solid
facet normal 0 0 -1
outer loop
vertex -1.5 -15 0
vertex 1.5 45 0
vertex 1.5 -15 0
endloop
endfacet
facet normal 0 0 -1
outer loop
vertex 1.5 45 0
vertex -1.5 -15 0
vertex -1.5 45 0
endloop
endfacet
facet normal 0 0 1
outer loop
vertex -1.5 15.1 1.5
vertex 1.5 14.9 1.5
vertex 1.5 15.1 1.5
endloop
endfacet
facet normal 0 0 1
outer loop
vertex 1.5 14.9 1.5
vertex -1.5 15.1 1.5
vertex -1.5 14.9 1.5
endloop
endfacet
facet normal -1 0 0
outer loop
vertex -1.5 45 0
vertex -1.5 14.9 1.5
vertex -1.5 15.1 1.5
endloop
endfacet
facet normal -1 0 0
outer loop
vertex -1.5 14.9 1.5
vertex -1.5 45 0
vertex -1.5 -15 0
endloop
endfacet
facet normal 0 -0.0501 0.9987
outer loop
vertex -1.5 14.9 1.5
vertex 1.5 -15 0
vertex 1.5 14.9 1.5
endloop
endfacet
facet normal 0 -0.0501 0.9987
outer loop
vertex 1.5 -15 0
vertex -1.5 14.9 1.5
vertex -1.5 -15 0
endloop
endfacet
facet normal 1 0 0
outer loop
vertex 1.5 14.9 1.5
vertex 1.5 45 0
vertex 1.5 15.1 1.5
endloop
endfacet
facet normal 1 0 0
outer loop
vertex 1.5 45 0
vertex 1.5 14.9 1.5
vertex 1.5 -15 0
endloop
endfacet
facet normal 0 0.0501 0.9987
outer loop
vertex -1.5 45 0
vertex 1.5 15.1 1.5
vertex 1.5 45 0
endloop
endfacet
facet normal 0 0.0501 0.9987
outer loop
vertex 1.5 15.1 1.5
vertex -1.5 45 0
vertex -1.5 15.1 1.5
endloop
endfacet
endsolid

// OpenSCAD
module splitWedge(w=3,l=30,h=1.5)
{
	shape_wedge(w,l,h,w,0.1,1,1);
	
	translate([0,30,0])
	rotate([0,0,180])
	shape_wedge(w,l,h,w,0.1,1,1);
}


module shape_wedge(x1,y1,z,x2,y2,x2p = 0.5,y2p = 0.5) 
{
	x = (x1-x2) * (x2p - 0.5);
	y = (y1-y2) * (y2p - 0.5);
	points = [
		[x1/2,y1/2,0],  // 0
		[x1/2,-y1/2,0], // 1
		[-x1/2,-y1/2,0],// 2
		[-x1/2,y1/2,0], // 3

		[(x2)/2+x,(y2)/2+y,z],  // 4
		[(x2)/2+x,-(y2)/2+y,z], // 5
		[-(x2)/2+x,-(y2)/2+y,z],// 6
		[-(x2)/2+x,(y2)/2+y,z], // 7
	]; 

	faces = [
		[3,2,1,0],
		[6,5,1,2],
		[7,6,2,3],
		[4,7,3,0],
		[5,4,0,1],
		[4,5,6,7]
	];

	polyhedron( points, faces );
}


splitWedge();
